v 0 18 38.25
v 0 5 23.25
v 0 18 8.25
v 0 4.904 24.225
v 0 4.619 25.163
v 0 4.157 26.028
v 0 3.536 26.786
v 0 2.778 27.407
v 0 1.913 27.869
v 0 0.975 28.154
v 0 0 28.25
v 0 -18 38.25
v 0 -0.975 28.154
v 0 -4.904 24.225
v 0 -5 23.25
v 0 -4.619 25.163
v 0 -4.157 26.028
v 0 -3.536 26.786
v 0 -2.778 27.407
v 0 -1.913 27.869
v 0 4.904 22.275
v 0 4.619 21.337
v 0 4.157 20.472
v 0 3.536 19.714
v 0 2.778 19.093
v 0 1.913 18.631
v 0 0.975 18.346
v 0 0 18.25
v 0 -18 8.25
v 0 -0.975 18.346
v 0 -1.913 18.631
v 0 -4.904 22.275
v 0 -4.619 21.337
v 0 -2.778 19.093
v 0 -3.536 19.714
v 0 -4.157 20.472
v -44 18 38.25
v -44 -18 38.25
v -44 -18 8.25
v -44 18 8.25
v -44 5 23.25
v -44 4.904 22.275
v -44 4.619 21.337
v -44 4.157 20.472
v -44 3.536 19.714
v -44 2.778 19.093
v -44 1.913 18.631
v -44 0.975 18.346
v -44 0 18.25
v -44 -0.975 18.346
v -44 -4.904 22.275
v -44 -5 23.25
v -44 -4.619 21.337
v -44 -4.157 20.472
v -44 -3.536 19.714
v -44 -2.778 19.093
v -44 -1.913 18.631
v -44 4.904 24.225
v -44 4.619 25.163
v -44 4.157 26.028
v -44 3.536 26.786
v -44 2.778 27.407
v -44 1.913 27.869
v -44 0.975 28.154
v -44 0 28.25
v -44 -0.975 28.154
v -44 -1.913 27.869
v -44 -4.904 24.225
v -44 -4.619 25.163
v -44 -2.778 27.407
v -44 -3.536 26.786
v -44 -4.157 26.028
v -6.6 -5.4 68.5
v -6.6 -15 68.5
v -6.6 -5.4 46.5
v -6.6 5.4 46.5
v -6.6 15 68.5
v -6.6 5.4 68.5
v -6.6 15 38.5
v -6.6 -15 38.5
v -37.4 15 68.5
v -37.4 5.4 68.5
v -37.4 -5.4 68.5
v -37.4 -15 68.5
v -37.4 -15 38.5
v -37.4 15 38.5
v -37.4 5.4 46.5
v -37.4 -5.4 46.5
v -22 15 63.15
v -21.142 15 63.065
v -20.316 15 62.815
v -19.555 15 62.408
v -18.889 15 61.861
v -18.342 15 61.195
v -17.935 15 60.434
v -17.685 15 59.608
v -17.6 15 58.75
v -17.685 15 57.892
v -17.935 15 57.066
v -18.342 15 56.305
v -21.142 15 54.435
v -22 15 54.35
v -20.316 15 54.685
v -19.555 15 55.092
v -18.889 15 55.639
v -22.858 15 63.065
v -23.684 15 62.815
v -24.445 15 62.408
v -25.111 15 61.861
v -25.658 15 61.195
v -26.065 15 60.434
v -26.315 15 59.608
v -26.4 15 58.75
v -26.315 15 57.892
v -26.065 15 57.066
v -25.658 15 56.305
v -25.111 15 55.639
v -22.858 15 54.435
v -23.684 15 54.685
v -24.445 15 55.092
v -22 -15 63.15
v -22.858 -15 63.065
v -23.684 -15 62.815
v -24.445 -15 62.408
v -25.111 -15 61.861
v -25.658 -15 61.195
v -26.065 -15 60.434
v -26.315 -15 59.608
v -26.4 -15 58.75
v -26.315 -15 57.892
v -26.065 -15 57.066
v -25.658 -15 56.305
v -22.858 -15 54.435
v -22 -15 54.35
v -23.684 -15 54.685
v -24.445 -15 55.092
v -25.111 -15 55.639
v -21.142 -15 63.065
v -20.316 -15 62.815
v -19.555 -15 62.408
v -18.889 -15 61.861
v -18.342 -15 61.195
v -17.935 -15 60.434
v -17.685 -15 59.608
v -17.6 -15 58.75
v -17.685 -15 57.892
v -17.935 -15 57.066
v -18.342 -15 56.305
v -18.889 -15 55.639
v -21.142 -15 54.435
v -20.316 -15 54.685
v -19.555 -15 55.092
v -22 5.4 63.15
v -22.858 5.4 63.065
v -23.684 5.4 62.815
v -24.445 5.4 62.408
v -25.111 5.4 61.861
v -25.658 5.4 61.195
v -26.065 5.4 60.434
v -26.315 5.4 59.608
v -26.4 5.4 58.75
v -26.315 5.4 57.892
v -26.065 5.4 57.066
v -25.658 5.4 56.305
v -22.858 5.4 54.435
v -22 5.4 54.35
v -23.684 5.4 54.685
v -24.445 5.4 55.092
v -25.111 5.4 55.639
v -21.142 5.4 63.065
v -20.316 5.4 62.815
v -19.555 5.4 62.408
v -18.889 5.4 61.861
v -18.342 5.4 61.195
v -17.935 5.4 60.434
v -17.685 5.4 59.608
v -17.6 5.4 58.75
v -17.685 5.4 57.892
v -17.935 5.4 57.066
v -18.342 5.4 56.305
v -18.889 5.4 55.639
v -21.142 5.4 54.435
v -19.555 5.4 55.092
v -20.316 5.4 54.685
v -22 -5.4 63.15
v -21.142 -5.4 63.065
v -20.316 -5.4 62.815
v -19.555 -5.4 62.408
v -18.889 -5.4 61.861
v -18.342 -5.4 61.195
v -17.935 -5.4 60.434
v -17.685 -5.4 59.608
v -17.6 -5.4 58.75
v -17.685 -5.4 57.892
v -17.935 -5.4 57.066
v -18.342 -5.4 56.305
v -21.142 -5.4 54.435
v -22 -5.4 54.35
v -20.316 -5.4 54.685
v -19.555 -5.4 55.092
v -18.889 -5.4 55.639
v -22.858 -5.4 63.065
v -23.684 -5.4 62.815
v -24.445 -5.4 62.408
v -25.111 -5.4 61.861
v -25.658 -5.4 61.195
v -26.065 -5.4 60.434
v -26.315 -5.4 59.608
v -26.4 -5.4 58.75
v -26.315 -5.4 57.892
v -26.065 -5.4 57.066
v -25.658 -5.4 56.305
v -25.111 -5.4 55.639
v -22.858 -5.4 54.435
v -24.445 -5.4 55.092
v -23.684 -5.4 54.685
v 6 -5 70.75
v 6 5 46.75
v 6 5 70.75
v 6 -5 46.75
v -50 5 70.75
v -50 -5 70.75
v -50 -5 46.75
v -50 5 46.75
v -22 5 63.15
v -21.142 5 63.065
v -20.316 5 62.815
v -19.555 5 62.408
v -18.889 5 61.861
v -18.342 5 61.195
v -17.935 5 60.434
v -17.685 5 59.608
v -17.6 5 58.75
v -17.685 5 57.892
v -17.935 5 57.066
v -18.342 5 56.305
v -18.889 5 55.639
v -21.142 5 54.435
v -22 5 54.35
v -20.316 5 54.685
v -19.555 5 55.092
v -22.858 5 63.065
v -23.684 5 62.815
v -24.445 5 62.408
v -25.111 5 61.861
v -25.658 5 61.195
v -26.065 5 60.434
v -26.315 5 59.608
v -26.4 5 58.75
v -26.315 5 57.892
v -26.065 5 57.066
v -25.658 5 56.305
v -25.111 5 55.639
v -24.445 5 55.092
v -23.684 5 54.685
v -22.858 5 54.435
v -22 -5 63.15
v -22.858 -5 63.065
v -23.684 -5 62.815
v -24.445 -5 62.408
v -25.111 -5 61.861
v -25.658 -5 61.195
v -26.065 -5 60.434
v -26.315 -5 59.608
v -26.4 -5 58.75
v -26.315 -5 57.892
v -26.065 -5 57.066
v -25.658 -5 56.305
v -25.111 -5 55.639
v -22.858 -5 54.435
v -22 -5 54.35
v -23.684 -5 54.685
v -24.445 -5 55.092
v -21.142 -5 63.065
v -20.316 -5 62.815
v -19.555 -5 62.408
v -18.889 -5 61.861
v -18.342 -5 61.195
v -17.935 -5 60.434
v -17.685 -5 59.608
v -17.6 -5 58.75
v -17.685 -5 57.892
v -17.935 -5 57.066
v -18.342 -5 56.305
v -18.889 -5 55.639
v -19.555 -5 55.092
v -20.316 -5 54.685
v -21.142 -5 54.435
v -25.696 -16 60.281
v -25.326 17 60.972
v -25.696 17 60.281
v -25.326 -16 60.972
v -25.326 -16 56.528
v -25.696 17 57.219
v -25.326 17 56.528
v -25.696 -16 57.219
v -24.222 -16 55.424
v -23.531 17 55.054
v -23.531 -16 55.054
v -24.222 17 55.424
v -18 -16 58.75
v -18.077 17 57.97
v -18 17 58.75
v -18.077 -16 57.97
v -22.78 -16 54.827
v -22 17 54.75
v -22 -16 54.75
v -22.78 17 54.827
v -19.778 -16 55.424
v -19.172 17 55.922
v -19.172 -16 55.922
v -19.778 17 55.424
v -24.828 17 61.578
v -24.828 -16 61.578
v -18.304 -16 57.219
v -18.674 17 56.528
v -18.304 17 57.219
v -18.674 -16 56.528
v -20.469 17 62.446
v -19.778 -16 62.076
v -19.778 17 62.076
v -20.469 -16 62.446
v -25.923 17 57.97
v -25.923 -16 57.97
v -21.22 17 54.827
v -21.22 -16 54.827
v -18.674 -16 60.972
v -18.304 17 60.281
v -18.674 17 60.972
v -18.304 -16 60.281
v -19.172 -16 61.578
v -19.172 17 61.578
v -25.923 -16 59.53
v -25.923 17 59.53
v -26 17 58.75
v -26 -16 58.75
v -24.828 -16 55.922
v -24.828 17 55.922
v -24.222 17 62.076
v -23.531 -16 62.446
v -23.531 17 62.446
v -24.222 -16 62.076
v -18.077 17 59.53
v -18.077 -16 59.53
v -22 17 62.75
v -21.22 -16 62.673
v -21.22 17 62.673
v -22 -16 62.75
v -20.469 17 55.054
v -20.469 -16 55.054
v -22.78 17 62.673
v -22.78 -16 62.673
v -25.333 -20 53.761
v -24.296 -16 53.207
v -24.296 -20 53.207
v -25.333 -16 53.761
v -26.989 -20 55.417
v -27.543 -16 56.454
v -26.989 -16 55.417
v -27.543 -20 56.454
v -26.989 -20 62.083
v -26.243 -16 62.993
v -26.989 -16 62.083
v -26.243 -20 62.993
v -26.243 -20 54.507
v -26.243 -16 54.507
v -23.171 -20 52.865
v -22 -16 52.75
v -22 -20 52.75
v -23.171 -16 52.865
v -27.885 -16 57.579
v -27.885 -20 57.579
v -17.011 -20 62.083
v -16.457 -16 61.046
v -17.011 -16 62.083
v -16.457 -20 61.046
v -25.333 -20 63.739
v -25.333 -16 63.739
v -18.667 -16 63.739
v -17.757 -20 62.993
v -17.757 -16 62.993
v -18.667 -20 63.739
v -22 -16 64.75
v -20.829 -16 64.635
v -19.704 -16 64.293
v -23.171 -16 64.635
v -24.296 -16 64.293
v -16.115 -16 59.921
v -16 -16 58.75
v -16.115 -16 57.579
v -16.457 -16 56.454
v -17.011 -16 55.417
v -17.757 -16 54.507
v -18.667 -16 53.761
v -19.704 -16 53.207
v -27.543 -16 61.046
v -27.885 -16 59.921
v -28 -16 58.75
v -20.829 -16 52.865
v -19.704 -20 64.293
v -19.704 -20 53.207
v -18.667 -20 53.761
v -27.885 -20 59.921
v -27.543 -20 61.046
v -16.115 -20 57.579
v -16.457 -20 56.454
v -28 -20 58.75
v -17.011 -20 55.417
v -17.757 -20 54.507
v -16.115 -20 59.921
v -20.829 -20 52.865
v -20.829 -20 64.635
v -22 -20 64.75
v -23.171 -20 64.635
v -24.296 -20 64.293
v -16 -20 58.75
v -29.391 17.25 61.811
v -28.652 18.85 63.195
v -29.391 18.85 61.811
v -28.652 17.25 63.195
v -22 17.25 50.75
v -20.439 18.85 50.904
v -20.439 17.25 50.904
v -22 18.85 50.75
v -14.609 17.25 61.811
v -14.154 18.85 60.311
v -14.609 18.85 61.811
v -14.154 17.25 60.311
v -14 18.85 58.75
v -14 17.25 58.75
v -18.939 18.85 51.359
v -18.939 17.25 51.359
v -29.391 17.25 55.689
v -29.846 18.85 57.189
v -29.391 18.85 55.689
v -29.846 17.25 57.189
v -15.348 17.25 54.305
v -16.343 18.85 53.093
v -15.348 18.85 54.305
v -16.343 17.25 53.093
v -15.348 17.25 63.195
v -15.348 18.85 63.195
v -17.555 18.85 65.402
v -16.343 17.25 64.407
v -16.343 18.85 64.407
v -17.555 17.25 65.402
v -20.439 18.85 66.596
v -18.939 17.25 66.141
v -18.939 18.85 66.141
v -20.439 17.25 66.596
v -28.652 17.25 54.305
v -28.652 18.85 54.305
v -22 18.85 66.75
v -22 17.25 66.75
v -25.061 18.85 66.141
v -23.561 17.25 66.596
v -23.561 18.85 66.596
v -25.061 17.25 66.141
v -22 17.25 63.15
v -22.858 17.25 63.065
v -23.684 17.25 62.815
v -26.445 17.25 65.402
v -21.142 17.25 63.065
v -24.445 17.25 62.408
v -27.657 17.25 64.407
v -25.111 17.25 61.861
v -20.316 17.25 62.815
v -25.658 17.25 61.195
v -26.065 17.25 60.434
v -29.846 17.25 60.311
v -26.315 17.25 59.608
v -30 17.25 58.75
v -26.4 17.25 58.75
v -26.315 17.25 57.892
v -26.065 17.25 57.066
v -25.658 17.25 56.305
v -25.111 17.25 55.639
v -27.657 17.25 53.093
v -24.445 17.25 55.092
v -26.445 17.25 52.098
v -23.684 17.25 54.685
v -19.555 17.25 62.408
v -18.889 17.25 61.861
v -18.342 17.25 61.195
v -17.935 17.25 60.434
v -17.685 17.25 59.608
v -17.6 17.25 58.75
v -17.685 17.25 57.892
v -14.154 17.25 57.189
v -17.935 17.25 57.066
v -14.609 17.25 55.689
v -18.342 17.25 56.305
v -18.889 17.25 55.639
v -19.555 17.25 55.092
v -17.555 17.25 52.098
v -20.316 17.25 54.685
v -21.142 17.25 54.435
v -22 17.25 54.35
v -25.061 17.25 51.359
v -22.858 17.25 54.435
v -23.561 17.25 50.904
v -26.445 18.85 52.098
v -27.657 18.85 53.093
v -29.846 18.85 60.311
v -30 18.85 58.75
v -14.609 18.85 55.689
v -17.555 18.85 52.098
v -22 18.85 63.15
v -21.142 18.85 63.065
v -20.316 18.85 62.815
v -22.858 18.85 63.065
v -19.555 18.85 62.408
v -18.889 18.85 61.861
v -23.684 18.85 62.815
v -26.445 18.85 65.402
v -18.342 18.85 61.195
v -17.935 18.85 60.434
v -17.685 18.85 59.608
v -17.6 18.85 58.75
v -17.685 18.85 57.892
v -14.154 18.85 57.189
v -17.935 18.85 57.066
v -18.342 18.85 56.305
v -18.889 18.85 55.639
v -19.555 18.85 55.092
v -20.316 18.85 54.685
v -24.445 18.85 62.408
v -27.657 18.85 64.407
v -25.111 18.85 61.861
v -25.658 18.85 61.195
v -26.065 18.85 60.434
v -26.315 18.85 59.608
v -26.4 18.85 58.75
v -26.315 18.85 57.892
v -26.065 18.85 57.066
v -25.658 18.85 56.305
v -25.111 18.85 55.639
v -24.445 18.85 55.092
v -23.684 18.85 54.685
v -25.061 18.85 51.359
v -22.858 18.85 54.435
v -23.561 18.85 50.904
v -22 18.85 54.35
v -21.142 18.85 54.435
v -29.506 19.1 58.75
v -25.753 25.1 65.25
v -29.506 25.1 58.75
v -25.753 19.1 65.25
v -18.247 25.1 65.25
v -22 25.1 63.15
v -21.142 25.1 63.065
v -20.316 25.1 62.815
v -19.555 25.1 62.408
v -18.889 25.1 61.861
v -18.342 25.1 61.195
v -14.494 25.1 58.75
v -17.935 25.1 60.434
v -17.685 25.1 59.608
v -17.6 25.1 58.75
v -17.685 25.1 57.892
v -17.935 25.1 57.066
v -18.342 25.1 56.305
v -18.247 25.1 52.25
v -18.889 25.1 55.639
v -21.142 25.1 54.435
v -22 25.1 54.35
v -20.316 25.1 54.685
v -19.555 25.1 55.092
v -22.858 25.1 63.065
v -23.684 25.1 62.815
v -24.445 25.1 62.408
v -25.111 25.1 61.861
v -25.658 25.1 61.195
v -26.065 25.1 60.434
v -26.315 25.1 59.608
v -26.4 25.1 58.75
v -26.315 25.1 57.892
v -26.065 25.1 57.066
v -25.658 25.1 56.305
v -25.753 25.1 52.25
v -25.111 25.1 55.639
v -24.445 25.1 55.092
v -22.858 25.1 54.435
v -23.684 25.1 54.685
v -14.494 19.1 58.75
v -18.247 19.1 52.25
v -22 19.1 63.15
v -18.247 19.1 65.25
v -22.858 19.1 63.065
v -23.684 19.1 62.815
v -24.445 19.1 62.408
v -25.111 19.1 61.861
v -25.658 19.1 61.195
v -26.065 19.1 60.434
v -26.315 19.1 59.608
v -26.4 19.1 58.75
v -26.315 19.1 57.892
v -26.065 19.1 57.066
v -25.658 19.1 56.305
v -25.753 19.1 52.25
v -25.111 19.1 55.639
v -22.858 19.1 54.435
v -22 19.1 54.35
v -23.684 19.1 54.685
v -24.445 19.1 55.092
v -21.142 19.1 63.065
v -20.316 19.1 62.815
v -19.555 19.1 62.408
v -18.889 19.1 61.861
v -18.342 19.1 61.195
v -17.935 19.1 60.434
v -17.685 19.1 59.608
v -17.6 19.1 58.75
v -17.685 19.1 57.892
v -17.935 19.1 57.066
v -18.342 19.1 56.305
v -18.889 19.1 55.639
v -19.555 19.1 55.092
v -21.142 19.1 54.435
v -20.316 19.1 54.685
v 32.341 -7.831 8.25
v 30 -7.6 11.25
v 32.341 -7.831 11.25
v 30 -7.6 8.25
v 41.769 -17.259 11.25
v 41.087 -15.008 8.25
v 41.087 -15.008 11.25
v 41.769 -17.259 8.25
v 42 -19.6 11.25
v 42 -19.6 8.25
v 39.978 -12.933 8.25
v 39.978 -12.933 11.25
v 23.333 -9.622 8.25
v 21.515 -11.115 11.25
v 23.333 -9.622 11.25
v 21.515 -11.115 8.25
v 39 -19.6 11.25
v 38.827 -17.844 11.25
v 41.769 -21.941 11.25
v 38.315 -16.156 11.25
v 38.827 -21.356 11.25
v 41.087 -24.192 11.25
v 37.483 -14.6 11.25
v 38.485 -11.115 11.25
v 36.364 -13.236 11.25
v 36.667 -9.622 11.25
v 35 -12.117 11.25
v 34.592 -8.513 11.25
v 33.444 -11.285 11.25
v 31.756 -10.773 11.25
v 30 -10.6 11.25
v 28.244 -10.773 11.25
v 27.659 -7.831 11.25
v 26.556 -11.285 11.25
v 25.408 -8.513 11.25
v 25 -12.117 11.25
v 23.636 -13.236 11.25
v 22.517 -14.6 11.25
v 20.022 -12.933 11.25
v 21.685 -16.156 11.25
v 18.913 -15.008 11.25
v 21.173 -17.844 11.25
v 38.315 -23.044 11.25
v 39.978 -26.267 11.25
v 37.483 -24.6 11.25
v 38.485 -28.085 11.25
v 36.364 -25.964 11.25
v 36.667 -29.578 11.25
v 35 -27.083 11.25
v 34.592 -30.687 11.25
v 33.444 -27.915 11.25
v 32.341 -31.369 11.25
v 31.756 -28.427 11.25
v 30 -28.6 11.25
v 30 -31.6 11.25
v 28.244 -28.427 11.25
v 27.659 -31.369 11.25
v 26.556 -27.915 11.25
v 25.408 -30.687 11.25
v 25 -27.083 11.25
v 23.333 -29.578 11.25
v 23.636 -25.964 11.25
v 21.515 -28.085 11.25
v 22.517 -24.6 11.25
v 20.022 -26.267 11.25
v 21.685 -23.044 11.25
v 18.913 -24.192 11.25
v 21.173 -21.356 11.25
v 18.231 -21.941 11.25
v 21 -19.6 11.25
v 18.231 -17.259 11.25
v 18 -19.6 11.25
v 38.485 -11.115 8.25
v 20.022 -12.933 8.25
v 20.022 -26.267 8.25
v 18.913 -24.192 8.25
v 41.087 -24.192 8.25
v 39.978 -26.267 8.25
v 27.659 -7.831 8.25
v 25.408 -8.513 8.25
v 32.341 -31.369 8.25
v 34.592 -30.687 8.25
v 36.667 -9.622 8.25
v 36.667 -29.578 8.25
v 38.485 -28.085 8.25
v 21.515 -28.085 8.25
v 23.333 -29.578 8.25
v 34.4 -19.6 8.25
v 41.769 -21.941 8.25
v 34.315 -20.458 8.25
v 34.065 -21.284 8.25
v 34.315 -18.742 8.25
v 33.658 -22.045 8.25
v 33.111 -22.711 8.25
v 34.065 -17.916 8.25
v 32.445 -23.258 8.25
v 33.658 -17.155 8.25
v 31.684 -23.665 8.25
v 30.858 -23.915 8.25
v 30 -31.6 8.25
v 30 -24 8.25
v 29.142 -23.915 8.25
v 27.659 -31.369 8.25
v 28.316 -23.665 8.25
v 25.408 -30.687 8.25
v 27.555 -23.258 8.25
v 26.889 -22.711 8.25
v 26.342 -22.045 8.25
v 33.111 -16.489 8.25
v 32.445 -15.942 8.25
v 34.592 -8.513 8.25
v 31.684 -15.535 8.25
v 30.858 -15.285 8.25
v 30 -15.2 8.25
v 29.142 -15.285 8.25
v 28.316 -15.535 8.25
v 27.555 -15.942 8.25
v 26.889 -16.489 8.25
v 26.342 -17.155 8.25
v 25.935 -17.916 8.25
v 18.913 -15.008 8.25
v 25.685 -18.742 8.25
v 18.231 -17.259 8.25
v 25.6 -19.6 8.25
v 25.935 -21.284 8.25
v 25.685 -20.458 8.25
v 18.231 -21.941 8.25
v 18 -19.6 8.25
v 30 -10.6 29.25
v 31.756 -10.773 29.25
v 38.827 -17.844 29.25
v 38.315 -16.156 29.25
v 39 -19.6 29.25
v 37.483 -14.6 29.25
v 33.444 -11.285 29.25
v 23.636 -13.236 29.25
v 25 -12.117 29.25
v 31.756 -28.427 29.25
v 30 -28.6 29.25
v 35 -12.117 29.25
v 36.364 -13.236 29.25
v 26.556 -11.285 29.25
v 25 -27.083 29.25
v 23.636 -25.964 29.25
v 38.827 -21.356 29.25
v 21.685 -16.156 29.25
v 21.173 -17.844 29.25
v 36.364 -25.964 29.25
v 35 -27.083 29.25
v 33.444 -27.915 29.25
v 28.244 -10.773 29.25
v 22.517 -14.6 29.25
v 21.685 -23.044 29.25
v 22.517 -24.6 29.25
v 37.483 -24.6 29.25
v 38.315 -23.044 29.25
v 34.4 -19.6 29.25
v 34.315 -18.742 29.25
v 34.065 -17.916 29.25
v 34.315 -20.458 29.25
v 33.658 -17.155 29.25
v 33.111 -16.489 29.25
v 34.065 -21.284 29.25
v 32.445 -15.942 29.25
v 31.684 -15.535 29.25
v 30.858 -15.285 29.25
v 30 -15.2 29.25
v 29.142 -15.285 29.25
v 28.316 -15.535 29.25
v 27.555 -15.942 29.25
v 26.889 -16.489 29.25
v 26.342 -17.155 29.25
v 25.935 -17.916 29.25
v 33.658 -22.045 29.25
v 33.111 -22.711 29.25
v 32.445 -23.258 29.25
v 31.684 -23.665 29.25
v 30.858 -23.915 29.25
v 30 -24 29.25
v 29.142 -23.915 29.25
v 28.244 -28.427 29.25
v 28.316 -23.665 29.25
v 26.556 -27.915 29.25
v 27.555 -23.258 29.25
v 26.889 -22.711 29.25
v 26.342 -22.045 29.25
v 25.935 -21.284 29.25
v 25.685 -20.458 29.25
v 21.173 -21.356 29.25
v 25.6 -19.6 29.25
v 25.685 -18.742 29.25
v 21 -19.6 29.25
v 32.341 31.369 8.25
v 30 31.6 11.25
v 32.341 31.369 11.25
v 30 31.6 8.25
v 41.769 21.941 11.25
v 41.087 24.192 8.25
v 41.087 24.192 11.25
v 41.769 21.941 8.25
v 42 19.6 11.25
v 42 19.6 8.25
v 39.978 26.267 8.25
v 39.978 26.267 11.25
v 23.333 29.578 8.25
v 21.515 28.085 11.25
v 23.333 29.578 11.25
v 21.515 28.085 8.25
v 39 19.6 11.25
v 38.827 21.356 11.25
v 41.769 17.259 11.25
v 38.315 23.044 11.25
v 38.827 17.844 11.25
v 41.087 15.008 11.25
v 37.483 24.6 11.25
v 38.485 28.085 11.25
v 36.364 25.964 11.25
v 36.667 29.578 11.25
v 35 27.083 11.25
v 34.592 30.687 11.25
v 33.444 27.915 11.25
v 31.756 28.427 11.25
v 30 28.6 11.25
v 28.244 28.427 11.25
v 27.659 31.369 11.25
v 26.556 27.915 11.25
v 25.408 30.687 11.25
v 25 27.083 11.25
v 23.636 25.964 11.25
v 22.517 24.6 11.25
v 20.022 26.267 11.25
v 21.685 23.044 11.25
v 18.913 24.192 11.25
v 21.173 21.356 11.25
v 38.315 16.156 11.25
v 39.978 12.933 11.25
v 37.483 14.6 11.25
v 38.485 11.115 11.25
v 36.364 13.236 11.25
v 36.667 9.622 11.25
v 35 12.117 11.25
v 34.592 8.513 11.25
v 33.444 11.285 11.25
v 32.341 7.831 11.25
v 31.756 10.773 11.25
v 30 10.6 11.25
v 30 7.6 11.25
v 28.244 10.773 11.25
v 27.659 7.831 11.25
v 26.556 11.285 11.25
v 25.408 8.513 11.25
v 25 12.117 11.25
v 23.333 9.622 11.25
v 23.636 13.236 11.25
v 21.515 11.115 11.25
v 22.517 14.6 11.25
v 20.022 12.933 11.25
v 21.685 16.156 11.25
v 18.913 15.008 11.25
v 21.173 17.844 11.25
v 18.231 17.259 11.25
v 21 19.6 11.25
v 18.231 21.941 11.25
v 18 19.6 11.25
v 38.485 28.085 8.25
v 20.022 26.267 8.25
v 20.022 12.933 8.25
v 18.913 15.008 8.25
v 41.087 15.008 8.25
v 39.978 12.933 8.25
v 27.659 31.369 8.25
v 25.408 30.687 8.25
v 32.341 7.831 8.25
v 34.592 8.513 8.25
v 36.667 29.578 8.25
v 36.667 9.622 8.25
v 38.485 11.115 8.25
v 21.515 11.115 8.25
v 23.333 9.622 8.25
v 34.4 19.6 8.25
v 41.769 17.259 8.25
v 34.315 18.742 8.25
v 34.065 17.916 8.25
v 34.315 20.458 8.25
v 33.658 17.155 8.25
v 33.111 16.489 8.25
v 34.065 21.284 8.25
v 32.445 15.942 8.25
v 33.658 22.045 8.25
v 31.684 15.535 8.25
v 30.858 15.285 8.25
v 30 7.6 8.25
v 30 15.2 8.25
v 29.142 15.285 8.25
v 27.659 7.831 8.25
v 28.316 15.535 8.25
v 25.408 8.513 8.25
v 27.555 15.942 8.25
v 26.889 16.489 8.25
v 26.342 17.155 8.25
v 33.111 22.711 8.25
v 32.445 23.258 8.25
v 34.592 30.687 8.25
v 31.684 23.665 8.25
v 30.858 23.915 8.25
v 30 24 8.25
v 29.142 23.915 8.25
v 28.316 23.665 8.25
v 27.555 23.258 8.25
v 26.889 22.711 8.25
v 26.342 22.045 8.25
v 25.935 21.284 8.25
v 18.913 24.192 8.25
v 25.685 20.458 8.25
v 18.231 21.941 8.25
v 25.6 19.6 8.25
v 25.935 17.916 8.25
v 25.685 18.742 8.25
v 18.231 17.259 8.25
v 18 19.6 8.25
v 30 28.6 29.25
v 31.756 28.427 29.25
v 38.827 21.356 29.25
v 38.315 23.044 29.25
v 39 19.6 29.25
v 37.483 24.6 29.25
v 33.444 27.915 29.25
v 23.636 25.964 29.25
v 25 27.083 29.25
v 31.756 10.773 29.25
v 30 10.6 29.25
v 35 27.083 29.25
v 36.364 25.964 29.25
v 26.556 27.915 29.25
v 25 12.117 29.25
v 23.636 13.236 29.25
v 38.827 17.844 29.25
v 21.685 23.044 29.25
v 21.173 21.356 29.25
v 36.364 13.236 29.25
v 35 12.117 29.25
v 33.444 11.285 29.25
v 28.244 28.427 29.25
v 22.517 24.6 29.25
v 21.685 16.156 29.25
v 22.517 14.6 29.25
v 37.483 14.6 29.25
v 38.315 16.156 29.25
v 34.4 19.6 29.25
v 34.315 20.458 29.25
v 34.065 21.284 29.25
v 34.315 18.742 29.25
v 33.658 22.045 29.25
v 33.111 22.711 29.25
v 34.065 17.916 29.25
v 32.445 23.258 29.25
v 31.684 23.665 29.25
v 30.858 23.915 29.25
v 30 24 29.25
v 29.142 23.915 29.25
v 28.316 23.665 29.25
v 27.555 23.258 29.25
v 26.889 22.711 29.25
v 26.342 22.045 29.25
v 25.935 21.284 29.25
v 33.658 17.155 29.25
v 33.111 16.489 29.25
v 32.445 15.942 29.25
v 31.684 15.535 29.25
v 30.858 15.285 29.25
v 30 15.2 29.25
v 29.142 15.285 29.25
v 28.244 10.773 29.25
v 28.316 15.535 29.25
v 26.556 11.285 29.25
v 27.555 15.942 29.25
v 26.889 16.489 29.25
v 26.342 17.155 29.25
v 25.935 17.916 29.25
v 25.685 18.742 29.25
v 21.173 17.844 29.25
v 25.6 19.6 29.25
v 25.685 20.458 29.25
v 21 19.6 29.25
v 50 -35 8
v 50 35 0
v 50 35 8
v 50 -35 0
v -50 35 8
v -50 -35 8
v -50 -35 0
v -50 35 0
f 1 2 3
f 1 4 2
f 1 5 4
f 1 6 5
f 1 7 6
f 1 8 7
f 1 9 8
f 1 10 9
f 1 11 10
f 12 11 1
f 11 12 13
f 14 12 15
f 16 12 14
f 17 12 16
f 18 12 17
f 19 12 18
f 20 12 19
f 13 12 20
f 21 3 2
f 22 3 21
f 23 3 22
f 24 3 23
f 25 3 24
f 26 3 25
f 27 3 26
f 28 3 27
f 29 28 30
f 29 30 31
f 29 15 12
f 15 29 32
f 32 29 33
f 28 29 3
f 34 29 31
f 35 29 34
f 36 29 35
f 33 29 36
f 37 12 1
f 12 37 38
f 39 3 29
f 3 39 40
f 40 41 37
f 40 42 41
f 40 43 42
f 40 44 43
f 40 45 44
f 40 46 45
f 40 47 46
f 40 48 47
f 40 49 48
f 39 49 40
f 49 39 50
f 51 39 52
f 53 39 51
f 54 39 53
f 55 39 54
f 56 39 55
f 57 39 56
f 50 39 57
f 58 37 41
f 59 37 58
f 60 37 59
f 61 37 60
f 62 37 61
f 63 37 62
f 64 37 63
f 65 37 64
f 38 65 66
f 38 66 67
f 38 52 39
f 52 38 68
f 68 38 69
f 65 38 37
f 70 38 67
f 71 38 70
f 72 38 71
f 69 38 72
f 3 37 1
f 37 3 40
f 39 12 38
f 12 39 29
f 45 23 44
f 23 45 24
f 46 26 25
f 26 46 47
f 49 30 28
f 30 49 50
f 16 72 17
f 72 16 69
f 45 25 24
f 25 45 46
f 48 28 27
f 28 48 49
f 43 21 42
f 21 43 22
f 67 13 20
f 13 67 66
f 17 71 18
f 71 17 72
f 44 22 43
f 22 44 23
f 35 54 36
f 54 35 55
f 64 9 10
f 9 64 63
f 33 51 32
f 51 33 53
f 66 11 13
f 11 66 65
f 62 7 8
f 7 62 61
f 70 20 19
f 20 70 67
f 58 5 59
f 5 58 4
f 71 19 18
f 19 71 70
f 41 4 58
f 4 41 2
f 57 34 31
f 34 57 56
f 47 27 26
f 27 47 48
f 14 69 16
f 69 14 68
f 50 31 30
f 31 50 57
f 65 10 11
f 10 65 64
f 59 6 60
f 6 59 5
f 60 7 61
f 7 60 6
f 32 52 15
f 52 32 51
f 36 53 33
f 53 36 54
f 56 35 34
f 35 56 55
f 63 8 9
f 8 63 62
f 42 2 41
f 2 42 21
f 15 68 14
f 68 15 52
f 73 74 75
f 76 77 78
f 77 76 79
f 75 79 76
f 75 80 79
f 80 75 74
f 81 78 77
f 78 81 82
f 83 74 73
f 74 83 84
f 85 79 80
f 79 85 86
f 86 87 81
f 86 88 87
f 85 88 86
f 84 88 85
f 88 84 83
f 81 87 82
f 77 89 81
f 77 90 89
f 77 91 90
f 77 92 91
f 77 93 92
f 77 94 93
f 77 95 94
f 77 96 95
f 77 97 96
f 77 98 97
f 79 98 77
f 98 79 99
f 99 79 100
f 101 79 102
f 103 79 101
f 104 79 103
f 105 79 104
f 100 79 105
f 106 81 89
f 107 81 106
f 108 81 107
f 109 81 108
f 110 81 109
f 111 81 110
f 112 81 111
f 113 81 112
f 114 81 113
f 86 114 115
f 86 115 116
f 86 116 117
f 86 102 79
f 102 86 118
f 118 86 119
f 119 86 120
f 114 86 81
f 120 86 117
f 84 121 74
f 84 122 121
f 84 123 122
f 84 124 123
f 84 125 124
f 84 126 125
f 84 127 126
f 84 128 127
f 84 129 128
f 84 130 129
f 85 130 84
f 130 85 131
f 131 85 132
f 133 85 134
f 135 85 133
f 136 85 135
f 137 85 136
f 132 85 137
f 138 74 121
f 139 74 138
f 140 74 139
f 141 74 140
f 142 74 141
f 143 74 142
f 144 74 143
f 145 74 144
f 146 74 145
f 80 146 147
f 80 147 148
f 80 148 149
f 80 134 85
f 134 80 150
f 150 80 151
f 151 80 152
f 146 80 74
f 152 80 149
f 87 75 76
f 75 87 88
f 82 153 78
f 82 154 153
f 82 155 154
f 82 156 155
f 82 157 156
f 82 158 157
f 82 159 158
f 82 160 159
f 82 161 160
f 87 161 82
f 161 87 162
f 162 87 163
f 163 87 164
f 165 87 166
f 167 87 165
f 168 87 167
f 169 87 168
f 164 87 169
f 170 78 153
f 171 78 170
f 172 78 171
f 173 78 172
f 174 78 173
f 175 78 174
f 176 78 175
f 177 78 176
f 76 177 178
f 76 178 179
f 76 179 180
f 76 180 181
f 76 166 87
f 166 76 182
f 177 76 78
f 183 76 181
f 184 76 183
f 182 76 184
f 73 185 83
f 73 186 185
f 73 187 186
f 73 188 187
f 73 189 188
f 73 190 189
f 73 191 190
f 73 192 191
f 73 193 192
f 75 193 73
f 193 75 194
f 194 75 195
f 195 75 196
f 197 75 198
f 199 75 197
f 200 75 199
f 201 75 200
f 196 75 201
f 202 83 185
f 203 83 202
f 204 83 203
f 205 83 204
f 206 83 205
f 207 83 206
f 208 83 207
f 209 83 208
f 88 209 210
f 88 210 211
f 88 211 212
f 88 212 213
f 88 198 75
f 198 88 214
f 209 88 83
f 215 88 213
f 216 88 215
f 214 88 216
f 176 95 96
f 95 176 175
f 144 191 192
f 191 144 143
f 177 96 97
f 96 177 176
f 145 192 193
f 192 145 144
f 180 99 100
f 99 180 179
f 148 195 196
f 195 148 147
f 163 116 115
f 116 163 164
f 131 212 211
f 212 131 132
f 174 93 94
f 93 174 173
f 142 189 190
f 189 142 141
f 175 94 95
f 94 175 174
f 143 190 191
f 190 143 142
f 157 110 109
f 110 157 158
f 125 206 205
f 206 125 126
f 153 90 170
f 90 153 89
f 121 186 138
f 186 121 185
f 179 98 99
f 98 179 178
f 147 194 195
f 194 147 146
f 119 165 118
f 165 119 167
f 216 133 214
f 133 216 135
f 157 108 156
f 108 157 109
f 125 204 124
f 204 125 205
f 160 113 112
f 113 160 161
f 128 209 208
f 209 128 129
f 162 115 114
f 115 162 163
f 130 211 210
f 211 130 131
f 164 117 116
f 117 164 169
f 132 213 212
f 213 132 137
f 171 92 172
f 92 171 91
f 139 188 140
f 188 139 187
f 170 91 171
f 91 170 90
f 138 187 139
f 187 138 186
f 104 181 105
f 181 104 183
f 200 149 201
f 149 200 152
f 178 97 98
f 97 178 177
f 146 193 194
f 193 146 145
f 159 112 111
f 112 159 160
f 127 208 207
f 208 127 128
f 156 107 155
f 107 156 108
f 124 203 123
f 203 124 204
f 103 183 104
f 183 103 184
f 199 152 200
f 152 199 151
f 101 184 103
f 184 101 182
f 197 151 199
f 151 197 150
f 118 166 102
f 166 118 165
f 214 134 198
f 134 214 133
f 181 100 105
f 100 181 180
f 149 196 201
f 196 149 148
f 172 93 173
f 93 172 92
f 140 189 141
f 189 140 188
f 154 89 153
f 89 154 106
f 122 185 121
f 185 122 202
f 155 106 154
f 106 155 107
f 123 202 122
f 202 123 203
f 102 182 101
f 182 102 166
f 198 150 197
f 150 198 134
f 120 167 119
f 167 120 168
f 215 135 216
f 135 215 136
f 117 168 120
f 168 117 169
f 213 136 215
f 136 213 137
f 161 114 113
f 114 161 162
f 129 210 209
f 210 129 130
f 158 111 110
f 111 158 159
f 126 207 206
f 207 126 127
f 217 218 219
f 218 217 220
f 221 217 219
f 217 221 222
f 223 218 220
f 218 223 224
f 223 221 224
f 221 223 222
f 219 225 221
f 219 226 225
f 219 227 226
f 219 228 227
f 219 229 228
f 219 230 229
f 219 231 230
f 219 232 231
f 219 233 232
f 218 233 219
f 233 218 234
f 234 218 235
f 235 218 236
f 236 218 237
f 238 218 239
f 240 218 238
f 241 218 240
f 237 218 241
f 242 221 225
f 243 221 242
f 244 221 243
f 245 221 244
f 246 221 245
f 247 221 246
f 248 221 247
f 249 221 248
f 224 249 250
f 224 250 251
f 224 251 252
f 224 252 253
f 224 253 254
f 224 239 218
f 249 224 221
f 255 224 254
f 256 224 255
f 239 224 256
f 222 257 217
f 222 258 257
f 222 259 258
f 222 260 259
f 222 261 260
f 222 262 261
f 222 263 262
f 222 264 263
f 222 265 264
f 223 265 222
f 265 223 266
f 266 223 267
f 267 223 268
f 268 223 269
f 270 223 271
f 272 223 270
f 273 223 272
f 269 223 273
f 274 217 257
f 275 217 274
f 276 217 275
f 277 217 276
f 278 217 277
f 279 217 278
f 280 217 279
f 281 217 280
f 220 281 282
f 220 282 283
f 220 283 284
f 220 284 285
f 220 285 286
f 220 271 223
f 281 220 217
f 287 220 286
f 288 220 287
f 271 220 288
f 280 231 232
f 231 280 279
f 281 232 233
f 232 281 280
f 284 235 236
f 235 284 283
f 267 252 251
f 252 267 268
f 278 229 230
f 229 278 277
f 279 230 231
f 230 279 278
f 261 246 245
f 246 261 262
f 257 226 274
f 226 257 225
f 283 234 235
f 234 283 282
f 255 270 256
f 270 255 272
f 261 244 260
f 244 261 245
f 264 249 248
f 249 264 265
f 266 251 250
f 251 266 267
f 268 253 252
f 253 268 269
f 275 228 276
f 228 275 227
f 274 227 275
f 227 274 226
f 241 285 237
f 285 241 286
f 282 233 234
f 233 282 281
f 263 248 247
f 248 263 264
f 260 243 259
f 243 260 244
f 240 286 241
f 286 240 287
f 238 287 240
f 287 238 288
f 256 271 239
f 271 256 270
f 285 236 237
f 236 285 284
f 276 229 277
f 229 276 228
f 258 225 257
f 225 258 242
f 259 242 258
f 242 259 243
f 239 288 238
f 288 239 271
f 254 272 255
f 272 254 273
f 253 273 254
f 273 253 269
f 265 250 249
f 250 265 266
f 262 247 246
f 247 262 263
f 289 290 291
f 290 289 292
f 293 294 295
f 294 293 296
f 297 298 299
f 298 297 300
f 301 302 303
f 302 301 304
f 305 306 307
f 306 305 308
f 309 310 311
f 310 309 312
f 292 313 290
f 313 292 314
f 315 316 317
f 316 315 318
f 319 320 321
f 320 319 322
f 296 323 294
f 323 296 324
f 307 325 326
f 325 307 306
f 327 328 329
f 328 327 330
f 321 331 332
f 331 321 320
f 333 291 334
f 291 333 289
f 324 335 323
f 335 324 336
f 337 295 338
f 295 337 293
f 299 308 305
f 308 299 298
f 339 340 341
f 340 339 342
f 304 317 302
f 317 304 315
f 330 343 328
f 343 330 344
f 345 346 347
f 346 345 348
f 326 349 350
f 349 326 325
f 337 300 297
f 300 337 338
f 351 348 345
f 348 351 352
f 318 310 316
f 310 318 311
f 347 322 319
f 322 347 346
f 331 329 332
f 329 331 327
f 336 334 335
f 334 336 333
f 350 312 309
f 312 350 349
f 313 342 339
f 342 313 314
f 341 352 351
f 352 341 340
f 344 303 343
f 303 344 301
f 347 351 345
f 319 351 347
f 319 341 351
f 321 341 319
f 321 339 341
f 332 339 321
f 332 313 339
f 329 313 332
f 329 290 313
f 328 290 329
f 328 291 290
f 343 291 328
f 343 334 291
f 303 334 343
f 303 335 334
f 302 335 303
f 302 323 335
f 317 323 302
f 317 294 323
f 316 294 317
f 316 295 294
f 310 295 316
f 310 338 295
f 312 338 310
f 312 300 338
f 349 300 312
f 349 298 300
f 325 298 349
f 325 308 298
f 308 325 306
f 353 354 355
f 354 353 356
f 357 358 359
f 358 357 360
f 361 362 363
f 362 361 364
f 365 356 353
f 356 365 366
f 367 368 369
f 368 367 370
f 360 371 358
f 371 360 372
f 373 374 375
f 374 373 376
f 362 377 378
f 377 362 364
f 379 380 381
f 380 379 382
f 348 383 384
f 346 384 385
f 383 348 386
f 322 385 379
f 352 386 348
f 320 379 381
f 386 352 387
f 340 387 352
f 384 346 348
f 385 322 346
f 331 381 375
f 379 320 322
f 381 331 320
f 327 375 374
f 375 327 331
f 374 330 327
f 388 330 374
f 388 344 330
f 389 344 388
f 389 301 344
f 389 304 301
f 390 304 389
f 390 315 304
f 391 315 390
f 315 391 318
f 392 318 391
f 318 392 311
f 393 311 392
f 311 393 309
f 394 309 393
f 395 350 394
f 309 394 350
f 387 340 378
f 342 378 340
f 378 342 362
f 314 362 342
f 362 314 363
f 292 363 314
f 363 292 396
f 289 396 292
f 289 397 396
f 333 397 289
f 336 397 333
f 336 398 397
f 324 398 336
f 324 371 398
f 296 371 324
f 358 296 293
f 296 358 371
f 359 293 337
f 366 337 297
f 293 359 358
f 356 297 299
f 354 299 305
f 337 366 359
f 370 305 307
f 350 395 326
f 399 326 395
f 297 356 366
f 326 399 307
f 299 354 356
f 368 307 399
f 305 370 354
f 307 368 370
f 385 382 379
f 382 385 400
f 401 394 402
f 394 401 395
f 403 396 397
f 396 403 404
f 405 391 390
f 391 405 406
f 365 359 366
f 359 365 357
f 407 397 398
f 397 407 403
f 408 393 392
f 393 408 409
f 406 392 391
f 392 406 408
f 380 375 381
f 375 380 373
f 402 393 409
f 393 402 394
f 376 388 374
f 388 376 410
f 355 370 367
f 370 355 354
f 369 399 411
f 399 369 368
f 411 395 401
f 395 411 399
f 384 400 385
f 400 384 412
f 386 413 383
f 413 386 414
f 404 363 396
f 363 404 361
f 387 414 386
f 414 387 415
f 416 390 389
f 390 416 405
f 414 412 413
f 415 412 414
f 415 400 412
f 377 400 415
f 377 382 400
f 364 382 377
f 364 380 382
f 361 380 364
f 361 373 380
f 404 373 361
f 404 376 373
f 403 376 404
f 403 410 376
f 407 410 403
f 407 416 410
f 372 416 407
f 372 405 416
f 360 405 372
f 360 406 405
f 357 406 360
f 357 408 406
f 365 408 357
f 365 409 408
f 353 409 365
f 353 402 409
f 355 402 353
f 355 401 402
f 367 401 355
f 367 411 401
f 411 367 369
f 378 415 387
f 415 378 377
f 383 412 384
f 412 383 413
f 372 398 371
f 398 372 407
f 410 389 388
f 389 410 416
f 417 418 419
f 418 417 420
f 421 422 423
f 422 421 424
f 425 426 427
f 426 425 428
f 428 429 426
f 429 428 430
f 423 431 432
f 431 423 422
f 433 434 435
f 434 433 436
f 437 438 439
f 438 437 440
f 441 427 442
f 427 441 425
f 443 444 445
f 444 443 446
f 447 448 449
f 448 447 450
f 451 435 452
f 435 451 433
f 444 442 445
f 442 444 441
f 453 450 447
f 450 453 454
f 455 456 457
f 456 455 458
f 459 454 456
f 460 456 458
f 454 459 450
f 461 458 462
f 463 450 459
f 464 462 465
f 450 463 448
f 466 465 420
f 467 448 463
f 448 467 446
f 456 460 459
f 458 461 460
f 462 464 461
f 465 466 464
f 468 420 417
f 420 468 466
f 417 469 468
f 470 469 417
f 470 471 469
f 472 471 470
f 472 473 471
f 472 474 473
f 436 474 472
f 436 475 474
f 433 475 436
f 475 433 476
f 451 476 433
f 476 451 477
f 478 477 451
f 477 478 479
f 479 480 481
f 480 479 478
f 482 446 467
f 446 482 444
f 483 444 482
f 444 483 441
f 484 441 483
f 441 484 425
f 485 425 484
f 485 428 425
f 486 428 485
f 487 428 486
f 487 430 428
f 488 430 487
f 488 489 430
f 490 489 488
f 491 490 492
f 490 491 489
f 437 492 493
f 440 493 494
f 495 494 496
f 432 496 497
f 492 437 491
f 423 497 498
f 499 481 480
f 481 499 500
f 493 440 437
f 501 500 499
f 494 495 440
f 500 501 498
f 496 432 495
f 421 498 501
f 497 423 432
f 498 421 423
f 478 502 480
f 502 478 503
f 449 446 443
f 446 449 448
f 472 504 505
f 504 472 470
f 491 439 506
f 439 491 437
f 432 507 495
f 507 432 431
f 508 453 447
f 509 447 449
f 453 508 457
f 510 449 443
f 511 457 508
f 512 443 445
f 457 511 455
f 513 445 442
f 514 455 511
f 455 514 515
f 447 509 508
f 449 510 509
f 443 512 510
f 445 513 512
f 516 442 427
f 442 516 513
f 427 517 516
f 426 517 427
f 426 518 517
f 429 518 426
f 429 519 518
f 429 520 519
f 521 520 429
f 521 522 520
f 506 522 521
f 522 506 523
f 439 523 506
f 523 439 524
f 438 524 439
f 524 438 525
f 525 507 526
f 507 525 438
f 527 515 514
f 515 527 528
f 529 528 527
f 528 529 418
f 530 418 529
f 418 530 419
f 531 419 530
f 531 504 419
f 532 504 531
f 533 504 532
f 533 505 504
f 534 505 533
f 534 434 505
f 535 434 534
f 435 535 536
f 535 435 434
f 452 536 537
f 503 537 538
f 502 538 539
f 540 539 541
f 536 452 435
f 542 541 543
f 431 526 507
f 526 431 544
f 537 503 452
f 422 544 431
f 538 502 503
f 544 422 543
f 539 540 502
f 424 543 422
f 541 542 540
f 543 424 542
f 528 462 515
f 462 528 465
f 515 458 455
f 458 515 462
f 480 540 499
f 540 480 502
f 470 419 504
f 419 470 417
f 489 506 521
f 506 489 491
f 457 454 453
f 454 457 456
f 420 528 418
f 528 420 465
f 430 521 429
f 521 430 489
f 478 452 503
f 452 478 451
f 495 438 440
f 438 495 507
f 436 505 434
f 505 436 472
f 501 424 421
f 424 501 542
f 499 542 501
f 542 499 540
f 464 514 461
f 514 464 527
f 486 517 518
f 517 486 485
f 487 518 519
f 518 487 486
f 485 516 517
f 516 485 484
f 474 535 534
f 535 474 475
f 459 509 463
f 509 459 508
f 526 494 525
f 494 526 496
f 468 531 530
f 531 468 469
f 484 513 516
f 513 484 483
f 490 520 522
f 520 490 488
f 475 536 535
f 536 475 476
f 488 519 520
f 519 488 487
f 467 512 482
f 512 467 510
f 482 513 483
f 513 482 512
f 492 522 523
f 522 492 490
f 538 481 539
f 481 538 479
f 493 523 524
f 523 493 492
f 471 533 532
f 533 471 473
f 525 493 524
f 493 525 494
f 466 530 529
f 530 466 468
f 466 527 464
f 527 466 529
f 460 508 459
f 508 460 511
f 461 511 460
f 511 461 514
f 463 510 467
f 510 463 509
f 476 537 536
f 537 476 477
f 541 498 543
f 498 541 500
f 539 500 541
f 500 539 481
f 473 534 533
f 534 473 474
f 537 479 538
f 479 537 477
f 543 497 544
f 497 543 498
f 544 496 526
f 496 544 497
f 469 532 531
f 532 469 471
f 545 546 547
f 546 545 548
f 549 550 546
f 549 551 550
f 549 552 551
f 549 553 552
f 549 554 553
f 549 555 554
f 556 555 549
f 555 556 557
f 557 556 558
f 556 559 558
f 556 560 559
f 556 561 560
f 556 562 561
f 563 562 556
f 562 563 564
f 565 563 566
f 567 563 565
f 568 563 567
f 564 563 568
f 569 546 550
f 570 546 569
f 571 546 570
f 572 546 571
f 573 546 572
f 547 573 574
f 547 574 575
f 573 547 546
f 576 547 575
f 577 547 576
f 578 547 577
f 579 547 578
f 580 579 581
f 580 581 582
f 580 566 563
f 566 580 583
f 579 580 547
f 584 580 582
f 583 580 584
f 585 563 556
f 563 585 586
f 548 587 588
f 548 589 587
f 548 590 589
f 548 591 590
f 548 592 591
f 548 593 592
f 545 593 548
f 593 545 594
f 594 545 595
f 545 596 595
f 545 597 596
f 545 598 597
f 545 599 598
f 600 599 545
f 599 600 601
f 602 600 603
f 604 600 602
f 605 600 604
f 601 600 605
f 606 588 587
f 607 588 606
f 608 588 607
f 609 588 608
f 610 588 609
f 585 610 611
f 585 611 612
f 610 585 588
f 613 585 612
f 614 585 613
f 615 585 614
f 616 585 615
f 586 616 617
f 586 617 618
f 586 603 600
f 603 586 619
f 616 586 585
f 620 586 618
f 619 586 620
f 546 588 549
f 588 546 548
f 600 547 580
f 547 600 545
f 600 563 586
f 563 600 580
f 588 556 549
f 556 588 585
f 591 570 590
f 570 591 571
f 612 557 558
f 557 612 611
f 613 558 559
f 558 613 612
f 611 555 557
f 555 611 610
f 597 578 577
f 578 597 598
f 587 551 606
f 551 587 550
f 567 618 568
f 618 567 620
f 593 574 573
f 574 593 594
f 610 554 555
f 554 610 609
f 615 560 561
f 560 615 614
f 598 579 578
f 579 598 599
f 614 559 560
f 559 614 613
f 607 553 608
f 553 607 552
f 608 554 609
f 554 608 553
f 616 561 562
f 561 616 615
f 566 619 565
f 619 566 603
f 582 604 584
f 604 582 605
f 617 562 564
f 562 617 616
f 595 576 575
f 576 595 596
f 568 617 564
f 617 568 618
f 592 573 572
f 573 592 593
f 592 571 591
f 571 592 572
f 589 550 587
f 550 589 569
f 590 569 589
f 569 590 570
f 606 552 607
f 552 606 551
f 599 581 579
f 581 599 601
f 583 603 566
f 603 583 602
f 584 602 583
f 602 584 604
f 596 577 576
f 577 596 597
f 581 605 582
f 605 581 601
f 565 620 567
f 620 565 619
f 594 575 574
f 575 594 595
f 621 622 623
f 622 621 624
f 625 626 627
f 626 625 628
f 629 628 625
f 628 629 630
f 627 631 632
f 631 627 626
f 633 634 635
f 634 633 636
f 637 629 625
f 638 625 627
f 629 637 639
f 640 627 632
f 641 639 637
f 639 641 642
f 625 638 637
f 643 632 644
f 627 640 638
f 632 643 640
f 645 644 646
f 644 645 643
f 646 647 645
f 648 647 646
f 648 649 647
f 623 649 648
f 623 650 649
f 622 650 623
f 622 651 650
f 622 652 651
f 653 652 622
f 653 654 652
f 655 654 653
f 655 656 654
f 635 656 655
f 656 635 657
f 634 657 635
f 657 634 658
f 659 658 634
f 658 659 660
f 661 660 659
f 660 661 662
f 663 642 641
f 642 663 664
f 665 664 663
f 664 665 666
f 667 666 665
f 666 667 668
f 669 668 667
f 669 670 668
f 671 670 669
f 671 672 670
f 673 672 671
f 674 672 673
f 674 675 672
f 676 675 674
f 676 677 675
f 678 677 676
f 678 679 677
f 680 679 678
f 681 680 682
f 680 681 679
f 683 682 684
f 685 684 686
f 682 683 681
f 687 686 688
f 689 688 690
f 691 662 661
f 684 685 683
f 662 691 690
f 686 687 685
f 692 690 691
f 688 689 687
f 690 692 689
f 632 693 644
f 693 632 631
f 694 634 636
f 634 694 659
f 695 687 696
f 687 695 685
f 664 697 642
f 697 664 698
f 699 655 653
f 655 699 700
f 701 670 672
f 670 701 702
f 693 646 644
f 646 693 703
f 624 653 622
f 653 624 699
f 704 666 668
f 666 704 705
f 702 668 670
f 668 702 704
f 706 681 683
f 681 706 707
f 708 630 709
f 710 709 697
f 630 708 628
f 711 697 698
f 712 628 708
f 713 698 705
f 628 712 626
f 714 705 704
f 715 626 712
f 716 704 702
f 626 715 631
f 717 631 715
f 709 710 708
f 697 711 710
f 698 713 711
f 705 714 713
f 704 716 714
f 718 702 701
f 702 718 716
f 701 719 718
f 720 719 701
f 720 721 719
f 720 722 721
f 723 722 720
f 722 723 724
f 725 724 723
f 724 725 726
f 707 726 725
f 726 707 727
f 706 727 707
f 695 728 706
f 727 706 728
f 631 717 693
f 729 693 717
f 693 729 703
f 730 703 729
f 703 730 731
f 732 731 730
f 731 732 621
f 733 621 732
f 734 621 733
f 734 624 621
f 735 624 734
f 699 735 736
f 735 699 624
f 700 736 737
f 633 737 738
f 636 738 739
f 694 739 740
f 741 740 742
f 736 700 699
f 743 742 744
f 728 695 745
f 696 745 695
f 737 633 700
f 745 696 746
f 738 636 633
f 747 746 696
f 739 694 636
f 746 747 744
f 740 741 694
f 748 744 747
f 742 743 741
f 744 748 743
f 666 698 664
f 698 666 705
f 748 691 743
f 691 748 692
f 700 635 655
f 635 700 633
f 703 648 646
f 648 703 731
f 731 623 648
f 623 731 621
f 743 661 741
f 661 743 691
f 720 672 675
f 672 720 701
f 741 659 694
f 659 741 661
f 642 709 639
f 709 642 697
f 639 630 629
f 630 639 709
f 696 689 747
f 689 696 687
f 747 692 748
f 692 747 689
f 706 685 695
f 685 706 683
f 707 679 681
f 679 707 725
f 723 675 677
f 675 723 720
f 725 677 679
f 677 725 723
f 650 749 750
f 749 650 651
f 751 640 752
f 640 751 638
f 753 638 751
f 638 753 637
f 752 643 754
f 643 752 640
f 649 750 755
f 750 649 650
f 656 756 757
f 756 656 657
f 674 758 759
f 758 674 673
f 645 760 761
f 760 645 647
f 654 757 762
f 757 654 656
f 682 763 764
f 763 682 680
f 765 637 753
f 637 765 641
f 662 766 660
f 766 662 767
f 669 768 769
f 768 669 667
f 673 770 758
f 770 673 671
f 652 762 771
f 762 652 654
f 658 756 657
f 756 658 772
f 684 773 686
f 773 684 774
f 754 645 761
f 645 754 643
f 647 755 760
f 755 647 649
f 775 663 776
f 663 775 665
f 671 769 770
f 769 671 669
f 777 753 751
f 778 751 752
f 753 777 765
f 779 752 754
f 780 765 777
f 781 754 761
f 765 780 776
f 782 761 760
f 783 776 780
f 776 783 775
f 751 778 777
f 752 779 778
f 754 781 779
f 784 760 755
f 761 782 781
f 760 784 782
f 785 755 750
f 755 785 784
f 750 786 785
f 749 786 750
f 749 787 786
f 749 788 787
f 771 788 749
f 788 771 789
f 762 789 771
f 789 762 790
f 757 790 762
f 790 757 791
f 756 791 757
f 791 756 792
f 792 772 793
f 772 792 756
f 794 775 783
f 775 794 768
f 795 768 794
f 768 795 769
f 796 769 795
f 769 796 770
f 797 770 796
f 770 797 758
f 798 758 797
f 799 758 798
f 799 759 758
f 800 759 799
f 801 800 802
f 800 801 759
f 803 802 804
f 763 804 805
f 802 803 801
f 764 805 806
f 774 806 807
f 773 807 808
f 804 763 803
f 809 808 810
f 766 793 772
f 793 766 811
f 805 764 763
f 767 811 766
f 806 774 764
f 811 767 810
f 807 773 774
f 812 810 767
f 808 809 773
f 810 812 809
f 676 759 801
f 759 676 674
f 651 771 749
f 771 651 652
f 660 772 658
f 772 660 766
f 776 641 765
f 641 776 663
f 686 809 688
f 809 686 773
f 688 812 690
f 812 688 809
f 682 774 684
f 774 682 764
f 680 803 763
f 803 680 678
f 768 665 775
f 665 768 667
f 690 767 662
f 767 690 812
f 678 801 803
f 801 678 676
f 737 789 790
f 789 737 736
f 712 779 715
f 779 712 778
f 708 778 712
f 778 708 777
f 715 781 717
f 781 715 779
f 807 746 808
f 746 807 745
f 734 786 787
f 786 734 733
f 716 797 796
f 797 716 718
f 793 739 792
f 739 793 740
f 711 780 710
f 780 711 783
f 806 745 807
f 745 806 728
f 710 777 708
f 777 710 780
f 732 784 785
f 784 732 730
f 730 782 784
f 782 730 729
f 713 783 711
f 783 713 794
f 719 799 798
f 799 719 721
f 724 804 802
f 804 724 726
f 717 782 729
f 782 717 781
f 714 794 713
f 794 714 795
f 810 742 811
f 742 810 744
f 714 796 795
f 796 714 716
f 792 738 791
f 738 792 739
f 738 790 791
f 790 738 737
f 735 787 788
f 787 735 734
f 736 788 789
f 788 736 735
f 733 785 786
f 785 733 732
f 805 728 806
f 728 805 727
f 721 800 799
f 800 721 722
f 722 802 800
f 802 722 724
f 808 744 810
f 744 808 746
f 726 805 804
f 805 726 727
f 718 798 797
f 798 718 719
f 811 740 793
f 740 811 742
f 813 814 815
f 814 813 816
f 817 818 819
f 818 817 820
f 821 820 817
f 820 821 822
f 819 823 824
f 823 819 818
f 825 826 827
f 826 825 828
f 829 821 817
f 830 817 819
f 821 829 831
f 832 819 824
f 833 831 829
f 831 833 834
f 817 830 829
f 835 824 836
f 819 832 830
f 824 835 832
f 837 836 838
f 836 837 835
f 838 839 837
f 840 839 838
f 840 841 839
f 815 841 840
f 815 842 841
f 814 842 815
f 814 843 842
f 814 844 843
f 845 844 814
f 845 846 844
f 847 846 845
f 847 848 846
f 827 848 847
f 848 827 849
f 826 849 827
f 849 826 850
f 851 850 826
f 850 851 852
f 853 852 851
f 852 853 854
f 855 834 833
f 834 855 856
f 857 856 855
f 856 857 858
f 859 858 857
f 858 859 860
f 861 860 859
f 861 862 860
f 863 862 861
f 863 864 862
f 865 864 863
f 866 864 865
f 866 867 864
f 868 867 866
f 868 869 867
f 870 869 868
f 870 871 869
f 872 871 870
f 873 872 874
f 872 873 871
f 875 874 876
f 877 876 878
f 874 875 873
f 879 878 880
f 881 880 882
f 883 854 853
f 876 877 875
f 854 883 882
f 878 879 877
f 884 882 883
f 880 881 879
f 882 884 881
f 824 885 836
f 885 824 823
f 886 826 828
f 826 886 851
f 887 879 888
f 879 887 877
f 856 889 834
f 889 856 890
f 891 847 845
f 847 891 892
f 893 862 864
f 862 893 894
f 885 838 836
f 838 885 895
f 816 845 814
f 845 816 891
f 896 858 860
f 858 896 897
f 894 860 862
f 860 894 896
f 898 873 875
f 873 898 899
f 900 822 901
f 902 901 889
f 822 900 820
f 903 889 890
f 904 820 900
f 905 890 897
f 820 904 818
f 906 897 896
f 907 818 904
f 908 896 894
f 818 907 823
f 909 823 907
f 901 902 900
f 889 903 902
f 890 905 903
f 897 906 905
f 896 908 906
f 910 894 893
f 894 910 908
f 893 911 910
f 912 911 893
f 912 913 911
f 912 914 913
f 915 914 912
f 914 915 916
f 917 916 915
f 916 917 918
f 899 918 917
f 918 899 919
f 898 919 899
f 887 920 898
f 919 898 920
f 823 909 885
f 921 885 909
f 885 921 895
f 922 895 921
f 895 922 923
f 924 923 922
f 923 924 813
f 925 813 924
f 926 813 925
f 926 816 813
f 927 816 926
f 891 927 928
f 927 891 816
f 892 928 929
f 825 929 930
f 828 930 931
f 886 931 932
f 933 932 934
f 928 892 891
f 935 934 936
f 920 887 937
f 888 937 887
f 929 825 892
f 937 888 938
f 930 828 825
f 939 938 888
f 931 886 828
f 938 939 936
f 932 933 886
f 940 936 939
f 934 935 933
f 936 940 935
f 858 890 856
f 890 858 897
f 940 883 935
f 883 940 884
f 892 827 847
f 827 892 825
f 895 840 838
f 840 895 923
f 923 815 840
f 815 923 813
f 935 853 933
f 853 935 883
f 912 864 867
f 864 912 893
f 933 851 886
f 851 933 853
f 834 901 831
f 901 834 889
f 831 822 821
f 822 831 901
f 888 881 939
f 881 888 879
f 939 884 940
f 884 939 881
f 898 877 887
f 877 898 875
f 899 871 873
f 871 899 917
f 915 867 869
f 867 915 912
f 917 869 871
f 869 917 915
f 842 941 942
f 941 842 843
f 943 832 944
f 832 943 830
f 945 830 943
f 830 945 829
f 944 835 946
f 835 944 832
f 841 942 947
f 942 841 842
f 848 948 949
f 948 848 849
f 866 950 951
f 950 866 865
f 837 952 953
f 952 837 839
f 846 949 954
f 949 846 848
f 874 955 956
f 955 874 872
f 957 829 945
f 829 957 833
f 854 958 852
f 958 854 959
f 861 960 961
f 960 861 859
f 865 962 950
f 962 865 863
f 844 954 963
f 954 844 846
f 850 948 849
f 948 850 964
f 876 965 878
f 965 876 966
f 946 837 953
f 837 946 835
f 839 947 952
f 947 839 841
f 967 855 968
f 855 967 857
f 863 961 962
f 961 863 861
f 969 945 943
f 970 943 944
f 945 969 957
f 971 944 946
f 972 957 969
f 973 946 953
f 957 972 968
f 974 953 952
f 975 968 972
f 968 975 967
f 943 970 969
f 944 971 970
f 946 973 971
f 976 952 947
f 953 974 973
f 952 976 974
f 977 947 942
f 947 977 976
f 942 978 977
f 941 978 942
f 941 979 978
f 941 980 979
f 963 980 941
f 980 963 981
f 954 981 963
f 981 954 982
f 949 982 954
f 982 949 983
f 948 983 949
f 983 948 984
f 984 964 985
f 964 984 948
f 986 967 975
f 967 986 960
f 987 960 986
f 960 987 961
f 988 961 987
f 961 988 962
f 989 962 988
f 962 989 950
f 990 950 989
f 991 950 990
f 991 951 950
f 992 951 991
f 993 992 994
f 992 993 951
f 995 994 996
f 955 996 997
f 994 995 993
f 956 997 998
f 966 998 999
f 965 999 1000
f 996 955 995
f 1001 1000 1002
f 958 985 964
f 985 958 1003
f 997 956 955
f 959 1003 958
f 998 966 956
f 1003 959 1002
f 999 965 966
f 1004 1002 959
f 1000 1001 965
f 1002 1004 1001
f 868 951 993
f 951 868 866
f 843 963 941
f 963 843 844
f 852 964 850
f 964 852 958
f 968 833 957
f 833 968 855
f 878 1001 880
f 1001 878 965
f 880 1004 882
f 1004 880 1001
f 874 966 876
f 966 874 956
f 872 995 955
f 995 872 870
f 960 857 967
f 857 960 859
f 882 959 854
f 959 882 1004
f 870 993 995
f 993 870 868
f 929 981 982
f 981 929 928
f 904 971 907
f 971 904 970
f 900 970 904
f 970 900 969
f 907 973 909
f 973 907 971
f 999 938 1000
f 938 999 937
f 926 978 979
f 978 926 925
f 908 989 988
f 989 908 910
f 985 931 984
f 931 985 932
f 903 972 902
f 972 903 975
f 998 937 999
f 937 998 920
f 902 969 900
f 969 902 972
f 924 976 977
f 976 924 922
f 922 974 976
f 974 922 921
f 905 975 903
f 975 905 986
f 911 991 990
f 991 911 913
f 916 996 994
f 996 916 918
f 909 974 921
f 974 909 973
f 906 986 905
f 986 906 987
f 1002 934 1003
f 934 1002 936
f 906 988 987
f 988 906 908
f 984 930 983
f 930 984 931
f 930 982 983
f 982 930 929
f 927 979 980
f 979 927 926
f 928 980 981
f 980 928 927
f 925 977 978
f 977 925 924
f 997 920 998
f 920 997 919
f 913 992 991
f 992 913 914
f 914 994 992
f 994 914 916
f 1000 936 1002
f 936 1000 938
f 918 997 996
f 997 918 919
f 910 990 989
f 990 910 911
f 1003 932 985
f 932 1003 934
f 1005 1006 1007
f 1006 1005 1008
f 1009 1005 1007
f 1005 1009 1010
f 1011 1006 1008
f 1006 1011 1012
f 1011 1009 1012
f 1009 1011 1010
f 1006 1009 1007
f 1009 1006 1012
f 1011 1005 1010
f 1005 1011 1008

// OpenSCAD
$fn = 32;

// ------------------------------------------------------------------------
// Indexing jig: plate 100 x 70 mm, pin d8
// Every part is its own module, assembly() places every instance.
// ------------------------------------------------------------------------

// --- part 1 ---
module jig_plate() {
  difference() {
    translate([-50, -35, 0]) cube([100, 70, 8]);
  }
}

// --- part 2 ---
module locator_block() {
  difference() {
    translate([-22, -18, 0]) cube([44, 36, 30]);
    translate([0, 0, 15]) rotate([0, 90, 0]) cylinder(h = 46, d = 10, center = true);
  }
}

// --- part 3 ---
module index_fork() {
  difference() {
    translate([-15.4, -15, 0]) cube([30.8, 30, 30]);
    translate([-16.4, -5.4, 8]) cube([32.8, 10.8, 23]);
    translate([0, 0, 20.25]) rotate([90, 0, 0]) cylinder(h = 32, d = 8.8, center = true);
  }
}

// --- part 4 ---
module index_arm() {
  difference() {
    translate([-28, -5, 0]) cube([56, 10, 24]);
    translate([0, 0, 12]) rotate([90, 0, 0]) cylinder(h = 12, d = 8.8, center = true);
  }
}

// --- part 5 ---
module index_pin() {
  rotate([0, 90, 0]) cylinder(h = 34, d = 8, center = true);
  translate([-20, 0, 0]) rotate([0, 90, 0]) cylinder(h = 4, d = 12);
}

// --- part 6 ---
module pin_washer() {
  difference() {
      translate([0, 0, 0]) cylinder(h = 1.6, d = 16);
      translate([0, 0, -1]) cylinder(h = 3.6, d = 8.8);
    }
}

// --- part 7 ---
module lock_nut() {
  difference() {
    linear_extrude(height = 6) polygon(points = [[7.506, 0], [3.753, 6.5], [-3.753, 6.5], [-7.506, 0], [-3.753, -6.5], [3.753, -6.5]]);
    translate([0, 0, -1]) cylinder(h = 8, d = 8.8);
  }
}

// --- part 8 ---
module guide_bush_a() {
  difference() {
    union() {
      cylinder(h = 3, d = 24);
      translate([0, 0, 3]) cylinder(h = 18, d = 18);
    }
    translate([0, 0, -1]) cylinder(h = 23, d = 8.8);
  }
}

// --- part 9 ---
module guide_bush_b() {
  difference() {
    union() {
      cylinder(h = 3, d = 24);
      translate([0, 0, 3]) cylinder(h = 18, d = 18);
    }
    translate([0, 0, -1]) cylinder(h = 23, d = 8.8);
  }
}

// --- assembly ---
module assembly() {
  color([0.80, 0.24, 0.20]) translate([0, 0, 0]) rotate([0, 0, 0]) jig_plate();
  color([0.20, 0.45, 0.75]) translate([-22, 0, 8.25]) rotate([0, 0, 0]) locator_block();
  color([0.25, 0.62, 0.32]) translate([-22, 0, 38.5]) rotate([0, 0, 0]) index_fork();
  color([0.92, 0.70, 0.18]) translate([-22, 0, 46.75]) rotate([0, 0, 0]) index_arm();
  color([0.58, 0.35, 0.70]) translate([-22, 0, 58.75]) rotate([0, 0, 90]) index_pin();
  color([0.16, 0.66, 0.66]) translate([-22, 18.85, 58.75]) rotate([90, 0, 0]) pin_washer();
  color([0.85, 0.48, 0.18]) translate([-22, 25.1, 58.75]) rotate([90, 0, 0]) lock_nut();
  color([0.55, 0.60, 0.65]) translate([30, -19.6, 8.25]) rotate([0, 0, 0]) guide_bush_a();
  color([0.75, 0.30, 0.55]) translate([30, 19.6, 8.25]) rotate([0, 0, 0]) guide_bush_b();
}

assembly();
